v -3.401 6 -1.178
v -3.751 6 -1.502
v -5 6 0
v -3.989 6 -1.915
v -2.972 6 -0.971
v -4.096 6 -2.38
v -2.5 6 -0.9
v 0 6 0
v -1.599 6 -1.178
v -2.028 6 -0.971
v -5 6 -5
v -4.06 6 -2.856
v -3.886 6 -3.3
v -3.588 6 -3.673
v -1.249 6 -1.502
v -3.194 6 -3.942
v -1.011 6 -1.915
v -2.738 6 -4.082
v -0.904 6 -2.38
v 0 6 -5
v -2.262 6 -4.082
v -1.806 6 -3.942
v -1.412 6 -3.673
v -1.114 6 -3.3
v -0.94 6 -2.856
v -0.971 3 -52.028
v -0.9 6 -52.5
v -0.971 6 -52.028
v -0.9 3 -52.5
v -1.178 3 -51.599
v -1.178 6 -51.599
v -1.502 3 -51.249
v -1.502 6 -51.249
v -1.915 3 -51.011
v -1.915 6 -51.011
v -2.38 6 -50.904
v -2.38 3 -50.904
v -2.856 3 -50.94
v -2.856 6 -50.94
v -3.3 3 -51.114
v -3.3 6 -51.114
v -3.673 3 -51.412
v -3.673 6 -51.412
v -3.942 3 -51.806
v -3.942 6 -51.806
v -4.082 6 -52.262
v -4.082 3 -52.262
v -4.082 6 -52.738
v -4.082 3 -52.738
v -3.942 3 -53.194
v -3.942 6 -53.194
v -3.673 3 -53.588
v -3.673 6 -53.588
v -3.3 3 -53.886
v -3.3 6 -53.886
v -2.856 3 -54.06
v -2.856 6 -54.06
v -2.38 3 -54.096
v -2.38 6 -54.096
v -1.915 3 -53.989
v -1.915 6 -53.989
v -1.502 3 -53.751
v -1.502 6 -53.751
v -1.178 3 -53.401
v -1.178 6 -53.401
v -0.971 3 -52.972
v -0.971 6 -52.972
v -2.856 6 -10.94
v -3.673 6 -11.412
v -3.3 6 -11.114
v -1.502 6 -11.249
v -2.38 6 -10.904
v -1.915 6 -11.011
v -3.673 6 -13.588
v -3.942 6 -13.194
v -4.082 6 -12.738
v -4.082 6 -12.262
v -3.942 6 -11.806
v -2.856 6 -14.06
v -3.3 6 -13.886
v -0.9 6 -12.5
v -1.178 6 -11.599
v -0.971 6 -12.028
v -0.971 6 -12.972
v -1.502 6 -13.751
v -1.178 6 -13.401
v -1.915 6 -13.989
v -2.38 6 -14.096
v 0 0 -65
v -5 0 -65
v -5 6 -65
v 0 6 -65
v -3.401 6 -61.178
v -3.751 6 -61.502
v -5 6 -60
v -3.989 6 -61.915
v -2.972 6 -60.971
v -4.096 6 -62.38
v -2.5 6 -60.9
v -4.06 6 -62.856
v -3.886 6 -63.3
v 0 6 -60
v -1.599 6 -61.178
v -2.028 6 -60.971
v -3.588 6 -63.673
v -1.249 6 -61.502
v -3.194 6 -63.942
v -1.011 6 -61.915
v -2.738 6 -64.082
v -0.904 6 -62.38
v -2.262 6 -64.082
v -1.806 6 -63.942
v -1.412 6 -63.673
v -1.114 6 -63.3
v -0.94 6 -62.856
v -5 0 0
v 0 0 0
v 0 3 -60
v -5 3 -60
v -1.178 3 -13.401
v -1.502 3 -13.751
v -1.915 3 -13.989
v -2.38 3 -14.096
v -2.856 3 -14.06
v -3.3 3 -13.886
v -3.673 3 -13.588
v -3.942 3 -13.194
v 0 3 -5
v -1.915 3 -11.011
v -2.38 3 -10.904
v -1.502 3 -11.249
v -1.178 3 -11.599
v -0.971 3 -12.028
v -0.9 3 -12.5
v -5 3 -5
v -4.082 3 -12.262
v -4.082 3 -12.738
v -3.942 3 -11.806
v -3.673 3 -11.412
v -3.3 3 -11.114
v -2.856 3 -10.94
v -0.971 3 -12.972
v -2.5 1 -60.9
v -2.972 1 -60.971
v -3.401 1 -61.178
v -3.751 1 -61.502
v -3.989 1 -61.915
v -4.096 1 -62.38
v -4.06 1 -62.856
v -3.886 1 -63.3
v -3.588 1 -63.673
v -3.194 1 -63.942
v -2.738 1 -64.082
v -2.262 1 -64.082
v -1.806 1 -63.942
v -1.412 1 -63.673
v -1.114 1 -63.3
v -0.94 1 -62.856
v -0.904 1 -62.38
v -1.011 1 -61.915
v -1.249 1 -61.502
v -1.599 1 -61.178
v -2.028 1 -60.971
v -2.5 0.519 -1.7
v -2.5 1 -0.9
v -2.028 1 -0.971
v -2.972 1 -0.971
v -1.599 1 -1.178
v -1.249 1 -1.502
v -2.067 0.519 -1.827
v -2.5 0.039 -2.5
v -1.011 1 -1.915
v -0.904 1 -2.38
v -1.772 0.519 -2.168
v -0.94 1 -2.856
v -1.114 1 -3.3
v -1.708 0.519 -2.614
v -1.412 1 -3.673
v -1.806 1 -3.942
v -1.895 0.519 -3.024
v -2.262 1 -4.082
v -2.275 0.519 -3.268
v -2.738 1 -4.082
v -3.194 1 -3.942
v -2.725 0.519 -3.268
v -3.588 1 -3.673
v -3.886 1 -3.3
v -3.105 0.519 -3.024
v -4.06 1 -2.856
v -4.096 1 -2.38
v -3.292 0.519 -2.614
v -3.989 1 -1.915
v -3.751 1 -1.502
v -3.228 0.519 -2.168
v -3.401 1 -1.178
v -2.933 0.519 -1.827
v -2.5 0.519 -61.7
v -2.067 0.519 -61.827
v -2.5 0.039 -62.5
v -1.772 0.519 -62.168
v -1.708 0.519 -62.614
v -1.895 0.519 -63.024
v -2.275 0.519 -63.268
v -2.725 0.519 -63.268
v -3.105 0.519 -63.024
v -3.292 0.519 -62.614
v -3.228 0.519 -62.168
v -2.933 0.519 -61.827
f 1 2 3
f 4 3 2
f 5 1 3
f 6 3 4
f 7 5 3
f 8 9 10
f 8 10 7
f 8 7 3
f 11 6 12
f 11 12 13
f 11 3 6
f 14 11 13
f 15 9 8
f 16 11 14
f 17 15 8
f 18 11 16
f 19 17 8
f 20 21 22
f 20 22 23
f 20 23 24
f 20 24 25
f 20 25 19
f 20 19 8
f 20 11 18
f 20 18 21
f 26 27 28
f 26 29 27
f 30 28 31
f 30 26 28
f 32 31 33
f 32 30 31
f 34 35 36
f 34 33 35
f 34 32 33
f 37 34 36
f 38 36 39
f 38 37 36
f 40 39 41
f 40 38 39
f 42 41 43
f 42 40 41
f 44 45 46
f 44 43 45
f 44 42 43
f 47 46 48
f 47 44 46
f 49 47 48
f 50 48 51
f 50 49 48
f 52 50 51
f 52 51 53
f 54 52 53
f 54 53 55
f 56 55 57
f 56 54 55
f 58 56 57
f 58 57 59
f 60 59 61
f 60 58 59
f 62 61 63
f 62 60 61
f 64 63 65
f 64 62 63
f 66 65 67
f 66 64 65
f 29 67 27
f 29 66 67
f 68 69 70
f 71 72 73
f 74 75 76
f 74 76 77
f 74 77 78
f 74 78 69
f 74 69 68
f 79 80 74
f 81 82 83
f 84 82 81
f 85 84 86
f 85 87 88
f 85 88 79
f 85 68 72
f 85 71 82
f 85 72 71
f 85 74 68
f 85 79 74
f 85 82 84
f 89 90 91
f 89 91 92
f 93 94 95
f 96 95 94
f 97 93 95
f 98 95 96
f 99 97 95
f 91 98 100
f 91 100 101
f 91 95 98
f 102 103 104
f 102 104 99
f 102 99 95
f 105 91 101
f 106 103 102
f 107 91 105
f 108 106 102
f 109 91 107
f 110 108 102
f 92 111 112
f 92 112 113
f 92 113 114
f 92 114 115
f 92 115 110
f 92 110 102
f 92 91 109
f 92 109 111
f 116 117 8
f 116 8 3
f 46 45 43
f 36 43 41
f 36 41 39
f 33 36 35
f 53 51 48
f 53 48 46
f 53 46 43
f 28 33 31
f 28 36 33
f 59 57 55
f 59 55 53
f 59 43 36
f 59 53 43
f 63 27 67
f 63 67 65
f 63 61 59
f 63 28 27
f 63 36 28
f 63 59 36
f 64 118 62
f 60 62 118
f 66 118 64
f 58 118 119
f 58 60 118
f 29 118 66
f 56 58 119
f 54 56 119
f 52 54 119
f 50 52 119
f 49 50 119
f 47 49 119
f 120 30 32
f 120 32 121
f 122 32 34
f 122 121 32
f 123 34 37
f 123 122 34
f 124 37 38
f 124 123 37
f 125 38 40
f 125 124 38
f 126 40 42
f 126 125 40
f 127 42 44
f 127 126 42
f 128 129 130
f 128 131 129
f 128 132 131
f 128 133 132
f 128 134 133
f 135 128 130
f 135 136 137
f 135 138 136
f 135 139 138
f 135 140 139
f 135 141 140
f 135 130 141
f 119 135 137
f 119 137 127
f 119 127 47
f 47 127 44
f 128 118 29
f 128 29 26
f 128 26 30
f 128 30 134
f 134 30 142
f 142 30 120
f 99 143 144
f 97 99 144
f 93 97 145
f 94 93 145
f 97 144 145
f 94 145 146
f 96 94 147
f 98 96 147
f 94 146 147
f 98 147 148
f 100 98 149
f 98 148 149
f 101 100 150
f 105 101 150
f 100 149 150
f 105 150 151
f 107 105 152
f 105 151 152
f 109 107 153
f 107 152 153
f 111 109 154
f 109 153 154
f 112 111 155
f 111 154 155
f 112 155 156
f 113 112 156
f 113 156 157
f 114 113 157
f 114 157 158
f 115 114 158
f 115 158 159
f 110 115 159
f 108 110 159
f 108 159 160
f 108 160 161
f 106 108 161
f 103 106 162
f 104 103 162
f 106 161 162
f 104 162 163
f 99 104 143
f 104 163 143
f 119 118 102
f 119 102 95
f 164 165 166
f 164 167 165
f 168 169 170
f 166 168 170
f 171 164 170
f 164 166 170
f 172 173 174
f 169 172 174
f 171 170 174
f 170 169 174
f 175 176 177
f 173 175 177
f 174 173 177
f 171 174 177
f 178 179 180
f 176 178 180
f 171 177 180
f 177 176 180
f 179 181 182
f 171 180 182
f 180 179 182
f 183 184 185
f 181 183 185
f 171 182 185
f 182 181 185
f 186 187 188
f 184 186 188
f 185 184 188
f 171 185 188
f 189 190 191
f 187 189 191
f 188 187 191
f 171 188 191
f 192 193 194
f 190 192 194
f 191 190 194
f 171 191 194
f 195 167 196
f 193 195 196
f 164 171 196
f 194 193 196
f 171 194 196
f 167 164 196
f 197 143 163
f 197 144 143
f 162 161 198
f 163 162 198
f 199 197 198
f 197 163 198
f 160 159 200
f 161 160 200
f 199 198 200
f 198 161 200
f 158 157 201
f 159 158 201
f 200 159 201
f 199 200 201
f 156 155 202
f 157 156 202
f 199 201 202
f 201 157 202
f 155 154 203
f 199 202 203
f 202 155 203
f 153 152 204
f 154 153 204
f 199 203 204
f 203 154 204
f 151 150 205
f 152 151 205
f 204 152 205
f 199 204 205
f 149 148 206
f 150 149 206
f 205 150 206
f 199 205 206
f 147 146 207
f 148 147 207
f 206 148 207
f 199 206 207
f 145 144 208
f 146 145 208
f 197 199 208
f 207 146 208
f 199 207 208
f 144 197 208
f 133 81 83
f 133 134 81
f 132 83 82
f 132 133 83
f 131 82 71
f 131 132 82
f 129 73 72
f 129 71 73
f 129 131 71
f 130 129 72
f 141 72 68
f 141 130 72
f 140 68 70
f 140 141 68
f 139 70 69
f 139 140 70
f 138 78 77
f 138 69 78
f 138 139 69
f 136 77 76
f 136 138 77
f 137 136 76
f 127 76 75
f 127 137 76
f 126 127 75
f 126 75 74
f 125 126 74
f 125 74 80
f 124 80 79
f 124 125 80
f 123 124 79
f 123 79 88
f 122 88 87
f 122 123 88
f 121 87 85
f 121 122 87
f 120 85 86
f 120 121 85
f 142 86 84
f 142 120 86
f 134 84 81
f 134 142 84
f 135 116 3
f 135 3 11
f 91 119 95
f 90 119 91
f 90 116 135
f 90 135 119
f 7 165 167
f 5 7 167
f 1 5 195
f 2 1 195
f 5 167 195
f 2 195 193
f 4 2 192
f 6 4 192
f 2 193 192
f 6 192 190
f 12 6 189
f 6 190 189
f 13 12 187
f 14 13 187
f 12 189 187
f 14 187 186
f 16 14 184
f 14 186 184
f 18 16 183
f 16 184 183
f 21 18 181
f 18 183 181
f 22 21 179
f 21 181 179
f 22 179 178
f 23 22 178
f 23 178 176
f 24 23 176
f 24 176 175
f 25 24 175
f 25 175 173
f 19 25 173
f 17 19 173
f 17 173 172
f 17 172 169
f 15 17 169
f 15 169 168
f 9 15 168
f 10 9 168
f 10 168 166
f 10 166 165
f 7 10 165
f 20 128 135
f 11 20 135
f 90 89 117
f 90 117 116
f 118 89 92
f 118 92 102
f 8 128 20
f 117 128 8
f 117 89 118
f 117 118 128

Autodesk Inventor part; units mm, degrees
ref_plane "YZ Plane" through (0, 0, 0) normal (1, 0, 0) x (0, 1, 0)
ref_plane "XZ Plane" through (0, 0, 0) normal (0, 1, 0) x (-1, 0, 0)
ref_plane "XY Plane" through (0, 0, 0) normal (0, 0, 1) x (1, 0, 0)
sketch "スケッチ1" plane through (0, 0, 0) normal (0, 1, 0) x (-1, 0, 0)
  line L0 (0, 0) -> (5, 0)
  line L1 (5, 0) -> (5, -65)
  line L2 (5, -65) -> (0, -65)
  line L3 (0, -65) -> (0, 0)
  dimension "d0" = 5
  dimension "d1" = 65
extrude "押し出し1" add sketch "スケッチ1" along normal blind 3
sketch "スケッチ2" plane through (0, 3, 0) normal (0, 1, 0) x (1, 0, 0)
  line L0 (-5, 0) -> (0, 0) projected
  line L1 (-5, 0) -> (0, 0)
  line L2 (0, 0) -> (0, 5)
  line L3 (0, 5) -> (-5, 5)
  line L4 (-5, 5) -> (-5, 0)
  line L5 (0, 65) -> (-5, 65) projected
  line L6 (-5, 65) -> (0, 65)
  line L7 (0, 65) -> (0, 60)
  line L8 (0, 60) -> (-5, 60)
  line L9 (-5, 60) -> (-5, 65)
  dimension "d4" = 5
  dimension "d5" = 5
  dimension "d6" = 5
  dimension "d7" = 5
extrude "押し出し2" add sketch "スケッチ2" along normal blind 3
sketch "スケッチ3" plane through (0, 6, 0) normal (0, 1, 0) x (1, 0, 0)
  line L0 (0, 60) -> (0, 65) projected
  line L1 (0, 65) -> (-5, 65) projected
  line L2 (-5, 0) -> (0, 0) projected
  point P0 (-2.5, 2.5)
  point P1 (-2.5, 62.5)
  dimension "d10" = 2.5
  dimension "d11" = 2.5
  dimension "d12" = 2.5
hole "穴1" at (-2.5, 6, -2.5) at (-2.5, 6, -62.5) direction (0, -1, 0) diameter 3.2 depth 5 tip angle 118
sketch "スケッチ4" plane through (0, 3, 0) normal (0, 1, 0) x (1, 0, 0)
  circle A0 centre (-2.5, 52.5) radius 1.6
  circle A1 centre (-2.5, 12.5) radius 1.6
  line L0 (0, 65) -> (-5, 65) projected
  line L1 (-5, 0) -> (0, 0) projected
  line L2 (-5, 60) -> (-5, 5) projected
  dimension "d20" = 3.2
  dimension "d21" = 3.2
  dimension "d22" = 40
  dimension "d23" = 12.5
  dimension "d24" = 12.5
  dimension "d25" = 2.5
extrude "押し出し3" add sketch "スケッチ4" along normal blind 3
properties part number "Tamiya-doubleGearBoxStopper"
